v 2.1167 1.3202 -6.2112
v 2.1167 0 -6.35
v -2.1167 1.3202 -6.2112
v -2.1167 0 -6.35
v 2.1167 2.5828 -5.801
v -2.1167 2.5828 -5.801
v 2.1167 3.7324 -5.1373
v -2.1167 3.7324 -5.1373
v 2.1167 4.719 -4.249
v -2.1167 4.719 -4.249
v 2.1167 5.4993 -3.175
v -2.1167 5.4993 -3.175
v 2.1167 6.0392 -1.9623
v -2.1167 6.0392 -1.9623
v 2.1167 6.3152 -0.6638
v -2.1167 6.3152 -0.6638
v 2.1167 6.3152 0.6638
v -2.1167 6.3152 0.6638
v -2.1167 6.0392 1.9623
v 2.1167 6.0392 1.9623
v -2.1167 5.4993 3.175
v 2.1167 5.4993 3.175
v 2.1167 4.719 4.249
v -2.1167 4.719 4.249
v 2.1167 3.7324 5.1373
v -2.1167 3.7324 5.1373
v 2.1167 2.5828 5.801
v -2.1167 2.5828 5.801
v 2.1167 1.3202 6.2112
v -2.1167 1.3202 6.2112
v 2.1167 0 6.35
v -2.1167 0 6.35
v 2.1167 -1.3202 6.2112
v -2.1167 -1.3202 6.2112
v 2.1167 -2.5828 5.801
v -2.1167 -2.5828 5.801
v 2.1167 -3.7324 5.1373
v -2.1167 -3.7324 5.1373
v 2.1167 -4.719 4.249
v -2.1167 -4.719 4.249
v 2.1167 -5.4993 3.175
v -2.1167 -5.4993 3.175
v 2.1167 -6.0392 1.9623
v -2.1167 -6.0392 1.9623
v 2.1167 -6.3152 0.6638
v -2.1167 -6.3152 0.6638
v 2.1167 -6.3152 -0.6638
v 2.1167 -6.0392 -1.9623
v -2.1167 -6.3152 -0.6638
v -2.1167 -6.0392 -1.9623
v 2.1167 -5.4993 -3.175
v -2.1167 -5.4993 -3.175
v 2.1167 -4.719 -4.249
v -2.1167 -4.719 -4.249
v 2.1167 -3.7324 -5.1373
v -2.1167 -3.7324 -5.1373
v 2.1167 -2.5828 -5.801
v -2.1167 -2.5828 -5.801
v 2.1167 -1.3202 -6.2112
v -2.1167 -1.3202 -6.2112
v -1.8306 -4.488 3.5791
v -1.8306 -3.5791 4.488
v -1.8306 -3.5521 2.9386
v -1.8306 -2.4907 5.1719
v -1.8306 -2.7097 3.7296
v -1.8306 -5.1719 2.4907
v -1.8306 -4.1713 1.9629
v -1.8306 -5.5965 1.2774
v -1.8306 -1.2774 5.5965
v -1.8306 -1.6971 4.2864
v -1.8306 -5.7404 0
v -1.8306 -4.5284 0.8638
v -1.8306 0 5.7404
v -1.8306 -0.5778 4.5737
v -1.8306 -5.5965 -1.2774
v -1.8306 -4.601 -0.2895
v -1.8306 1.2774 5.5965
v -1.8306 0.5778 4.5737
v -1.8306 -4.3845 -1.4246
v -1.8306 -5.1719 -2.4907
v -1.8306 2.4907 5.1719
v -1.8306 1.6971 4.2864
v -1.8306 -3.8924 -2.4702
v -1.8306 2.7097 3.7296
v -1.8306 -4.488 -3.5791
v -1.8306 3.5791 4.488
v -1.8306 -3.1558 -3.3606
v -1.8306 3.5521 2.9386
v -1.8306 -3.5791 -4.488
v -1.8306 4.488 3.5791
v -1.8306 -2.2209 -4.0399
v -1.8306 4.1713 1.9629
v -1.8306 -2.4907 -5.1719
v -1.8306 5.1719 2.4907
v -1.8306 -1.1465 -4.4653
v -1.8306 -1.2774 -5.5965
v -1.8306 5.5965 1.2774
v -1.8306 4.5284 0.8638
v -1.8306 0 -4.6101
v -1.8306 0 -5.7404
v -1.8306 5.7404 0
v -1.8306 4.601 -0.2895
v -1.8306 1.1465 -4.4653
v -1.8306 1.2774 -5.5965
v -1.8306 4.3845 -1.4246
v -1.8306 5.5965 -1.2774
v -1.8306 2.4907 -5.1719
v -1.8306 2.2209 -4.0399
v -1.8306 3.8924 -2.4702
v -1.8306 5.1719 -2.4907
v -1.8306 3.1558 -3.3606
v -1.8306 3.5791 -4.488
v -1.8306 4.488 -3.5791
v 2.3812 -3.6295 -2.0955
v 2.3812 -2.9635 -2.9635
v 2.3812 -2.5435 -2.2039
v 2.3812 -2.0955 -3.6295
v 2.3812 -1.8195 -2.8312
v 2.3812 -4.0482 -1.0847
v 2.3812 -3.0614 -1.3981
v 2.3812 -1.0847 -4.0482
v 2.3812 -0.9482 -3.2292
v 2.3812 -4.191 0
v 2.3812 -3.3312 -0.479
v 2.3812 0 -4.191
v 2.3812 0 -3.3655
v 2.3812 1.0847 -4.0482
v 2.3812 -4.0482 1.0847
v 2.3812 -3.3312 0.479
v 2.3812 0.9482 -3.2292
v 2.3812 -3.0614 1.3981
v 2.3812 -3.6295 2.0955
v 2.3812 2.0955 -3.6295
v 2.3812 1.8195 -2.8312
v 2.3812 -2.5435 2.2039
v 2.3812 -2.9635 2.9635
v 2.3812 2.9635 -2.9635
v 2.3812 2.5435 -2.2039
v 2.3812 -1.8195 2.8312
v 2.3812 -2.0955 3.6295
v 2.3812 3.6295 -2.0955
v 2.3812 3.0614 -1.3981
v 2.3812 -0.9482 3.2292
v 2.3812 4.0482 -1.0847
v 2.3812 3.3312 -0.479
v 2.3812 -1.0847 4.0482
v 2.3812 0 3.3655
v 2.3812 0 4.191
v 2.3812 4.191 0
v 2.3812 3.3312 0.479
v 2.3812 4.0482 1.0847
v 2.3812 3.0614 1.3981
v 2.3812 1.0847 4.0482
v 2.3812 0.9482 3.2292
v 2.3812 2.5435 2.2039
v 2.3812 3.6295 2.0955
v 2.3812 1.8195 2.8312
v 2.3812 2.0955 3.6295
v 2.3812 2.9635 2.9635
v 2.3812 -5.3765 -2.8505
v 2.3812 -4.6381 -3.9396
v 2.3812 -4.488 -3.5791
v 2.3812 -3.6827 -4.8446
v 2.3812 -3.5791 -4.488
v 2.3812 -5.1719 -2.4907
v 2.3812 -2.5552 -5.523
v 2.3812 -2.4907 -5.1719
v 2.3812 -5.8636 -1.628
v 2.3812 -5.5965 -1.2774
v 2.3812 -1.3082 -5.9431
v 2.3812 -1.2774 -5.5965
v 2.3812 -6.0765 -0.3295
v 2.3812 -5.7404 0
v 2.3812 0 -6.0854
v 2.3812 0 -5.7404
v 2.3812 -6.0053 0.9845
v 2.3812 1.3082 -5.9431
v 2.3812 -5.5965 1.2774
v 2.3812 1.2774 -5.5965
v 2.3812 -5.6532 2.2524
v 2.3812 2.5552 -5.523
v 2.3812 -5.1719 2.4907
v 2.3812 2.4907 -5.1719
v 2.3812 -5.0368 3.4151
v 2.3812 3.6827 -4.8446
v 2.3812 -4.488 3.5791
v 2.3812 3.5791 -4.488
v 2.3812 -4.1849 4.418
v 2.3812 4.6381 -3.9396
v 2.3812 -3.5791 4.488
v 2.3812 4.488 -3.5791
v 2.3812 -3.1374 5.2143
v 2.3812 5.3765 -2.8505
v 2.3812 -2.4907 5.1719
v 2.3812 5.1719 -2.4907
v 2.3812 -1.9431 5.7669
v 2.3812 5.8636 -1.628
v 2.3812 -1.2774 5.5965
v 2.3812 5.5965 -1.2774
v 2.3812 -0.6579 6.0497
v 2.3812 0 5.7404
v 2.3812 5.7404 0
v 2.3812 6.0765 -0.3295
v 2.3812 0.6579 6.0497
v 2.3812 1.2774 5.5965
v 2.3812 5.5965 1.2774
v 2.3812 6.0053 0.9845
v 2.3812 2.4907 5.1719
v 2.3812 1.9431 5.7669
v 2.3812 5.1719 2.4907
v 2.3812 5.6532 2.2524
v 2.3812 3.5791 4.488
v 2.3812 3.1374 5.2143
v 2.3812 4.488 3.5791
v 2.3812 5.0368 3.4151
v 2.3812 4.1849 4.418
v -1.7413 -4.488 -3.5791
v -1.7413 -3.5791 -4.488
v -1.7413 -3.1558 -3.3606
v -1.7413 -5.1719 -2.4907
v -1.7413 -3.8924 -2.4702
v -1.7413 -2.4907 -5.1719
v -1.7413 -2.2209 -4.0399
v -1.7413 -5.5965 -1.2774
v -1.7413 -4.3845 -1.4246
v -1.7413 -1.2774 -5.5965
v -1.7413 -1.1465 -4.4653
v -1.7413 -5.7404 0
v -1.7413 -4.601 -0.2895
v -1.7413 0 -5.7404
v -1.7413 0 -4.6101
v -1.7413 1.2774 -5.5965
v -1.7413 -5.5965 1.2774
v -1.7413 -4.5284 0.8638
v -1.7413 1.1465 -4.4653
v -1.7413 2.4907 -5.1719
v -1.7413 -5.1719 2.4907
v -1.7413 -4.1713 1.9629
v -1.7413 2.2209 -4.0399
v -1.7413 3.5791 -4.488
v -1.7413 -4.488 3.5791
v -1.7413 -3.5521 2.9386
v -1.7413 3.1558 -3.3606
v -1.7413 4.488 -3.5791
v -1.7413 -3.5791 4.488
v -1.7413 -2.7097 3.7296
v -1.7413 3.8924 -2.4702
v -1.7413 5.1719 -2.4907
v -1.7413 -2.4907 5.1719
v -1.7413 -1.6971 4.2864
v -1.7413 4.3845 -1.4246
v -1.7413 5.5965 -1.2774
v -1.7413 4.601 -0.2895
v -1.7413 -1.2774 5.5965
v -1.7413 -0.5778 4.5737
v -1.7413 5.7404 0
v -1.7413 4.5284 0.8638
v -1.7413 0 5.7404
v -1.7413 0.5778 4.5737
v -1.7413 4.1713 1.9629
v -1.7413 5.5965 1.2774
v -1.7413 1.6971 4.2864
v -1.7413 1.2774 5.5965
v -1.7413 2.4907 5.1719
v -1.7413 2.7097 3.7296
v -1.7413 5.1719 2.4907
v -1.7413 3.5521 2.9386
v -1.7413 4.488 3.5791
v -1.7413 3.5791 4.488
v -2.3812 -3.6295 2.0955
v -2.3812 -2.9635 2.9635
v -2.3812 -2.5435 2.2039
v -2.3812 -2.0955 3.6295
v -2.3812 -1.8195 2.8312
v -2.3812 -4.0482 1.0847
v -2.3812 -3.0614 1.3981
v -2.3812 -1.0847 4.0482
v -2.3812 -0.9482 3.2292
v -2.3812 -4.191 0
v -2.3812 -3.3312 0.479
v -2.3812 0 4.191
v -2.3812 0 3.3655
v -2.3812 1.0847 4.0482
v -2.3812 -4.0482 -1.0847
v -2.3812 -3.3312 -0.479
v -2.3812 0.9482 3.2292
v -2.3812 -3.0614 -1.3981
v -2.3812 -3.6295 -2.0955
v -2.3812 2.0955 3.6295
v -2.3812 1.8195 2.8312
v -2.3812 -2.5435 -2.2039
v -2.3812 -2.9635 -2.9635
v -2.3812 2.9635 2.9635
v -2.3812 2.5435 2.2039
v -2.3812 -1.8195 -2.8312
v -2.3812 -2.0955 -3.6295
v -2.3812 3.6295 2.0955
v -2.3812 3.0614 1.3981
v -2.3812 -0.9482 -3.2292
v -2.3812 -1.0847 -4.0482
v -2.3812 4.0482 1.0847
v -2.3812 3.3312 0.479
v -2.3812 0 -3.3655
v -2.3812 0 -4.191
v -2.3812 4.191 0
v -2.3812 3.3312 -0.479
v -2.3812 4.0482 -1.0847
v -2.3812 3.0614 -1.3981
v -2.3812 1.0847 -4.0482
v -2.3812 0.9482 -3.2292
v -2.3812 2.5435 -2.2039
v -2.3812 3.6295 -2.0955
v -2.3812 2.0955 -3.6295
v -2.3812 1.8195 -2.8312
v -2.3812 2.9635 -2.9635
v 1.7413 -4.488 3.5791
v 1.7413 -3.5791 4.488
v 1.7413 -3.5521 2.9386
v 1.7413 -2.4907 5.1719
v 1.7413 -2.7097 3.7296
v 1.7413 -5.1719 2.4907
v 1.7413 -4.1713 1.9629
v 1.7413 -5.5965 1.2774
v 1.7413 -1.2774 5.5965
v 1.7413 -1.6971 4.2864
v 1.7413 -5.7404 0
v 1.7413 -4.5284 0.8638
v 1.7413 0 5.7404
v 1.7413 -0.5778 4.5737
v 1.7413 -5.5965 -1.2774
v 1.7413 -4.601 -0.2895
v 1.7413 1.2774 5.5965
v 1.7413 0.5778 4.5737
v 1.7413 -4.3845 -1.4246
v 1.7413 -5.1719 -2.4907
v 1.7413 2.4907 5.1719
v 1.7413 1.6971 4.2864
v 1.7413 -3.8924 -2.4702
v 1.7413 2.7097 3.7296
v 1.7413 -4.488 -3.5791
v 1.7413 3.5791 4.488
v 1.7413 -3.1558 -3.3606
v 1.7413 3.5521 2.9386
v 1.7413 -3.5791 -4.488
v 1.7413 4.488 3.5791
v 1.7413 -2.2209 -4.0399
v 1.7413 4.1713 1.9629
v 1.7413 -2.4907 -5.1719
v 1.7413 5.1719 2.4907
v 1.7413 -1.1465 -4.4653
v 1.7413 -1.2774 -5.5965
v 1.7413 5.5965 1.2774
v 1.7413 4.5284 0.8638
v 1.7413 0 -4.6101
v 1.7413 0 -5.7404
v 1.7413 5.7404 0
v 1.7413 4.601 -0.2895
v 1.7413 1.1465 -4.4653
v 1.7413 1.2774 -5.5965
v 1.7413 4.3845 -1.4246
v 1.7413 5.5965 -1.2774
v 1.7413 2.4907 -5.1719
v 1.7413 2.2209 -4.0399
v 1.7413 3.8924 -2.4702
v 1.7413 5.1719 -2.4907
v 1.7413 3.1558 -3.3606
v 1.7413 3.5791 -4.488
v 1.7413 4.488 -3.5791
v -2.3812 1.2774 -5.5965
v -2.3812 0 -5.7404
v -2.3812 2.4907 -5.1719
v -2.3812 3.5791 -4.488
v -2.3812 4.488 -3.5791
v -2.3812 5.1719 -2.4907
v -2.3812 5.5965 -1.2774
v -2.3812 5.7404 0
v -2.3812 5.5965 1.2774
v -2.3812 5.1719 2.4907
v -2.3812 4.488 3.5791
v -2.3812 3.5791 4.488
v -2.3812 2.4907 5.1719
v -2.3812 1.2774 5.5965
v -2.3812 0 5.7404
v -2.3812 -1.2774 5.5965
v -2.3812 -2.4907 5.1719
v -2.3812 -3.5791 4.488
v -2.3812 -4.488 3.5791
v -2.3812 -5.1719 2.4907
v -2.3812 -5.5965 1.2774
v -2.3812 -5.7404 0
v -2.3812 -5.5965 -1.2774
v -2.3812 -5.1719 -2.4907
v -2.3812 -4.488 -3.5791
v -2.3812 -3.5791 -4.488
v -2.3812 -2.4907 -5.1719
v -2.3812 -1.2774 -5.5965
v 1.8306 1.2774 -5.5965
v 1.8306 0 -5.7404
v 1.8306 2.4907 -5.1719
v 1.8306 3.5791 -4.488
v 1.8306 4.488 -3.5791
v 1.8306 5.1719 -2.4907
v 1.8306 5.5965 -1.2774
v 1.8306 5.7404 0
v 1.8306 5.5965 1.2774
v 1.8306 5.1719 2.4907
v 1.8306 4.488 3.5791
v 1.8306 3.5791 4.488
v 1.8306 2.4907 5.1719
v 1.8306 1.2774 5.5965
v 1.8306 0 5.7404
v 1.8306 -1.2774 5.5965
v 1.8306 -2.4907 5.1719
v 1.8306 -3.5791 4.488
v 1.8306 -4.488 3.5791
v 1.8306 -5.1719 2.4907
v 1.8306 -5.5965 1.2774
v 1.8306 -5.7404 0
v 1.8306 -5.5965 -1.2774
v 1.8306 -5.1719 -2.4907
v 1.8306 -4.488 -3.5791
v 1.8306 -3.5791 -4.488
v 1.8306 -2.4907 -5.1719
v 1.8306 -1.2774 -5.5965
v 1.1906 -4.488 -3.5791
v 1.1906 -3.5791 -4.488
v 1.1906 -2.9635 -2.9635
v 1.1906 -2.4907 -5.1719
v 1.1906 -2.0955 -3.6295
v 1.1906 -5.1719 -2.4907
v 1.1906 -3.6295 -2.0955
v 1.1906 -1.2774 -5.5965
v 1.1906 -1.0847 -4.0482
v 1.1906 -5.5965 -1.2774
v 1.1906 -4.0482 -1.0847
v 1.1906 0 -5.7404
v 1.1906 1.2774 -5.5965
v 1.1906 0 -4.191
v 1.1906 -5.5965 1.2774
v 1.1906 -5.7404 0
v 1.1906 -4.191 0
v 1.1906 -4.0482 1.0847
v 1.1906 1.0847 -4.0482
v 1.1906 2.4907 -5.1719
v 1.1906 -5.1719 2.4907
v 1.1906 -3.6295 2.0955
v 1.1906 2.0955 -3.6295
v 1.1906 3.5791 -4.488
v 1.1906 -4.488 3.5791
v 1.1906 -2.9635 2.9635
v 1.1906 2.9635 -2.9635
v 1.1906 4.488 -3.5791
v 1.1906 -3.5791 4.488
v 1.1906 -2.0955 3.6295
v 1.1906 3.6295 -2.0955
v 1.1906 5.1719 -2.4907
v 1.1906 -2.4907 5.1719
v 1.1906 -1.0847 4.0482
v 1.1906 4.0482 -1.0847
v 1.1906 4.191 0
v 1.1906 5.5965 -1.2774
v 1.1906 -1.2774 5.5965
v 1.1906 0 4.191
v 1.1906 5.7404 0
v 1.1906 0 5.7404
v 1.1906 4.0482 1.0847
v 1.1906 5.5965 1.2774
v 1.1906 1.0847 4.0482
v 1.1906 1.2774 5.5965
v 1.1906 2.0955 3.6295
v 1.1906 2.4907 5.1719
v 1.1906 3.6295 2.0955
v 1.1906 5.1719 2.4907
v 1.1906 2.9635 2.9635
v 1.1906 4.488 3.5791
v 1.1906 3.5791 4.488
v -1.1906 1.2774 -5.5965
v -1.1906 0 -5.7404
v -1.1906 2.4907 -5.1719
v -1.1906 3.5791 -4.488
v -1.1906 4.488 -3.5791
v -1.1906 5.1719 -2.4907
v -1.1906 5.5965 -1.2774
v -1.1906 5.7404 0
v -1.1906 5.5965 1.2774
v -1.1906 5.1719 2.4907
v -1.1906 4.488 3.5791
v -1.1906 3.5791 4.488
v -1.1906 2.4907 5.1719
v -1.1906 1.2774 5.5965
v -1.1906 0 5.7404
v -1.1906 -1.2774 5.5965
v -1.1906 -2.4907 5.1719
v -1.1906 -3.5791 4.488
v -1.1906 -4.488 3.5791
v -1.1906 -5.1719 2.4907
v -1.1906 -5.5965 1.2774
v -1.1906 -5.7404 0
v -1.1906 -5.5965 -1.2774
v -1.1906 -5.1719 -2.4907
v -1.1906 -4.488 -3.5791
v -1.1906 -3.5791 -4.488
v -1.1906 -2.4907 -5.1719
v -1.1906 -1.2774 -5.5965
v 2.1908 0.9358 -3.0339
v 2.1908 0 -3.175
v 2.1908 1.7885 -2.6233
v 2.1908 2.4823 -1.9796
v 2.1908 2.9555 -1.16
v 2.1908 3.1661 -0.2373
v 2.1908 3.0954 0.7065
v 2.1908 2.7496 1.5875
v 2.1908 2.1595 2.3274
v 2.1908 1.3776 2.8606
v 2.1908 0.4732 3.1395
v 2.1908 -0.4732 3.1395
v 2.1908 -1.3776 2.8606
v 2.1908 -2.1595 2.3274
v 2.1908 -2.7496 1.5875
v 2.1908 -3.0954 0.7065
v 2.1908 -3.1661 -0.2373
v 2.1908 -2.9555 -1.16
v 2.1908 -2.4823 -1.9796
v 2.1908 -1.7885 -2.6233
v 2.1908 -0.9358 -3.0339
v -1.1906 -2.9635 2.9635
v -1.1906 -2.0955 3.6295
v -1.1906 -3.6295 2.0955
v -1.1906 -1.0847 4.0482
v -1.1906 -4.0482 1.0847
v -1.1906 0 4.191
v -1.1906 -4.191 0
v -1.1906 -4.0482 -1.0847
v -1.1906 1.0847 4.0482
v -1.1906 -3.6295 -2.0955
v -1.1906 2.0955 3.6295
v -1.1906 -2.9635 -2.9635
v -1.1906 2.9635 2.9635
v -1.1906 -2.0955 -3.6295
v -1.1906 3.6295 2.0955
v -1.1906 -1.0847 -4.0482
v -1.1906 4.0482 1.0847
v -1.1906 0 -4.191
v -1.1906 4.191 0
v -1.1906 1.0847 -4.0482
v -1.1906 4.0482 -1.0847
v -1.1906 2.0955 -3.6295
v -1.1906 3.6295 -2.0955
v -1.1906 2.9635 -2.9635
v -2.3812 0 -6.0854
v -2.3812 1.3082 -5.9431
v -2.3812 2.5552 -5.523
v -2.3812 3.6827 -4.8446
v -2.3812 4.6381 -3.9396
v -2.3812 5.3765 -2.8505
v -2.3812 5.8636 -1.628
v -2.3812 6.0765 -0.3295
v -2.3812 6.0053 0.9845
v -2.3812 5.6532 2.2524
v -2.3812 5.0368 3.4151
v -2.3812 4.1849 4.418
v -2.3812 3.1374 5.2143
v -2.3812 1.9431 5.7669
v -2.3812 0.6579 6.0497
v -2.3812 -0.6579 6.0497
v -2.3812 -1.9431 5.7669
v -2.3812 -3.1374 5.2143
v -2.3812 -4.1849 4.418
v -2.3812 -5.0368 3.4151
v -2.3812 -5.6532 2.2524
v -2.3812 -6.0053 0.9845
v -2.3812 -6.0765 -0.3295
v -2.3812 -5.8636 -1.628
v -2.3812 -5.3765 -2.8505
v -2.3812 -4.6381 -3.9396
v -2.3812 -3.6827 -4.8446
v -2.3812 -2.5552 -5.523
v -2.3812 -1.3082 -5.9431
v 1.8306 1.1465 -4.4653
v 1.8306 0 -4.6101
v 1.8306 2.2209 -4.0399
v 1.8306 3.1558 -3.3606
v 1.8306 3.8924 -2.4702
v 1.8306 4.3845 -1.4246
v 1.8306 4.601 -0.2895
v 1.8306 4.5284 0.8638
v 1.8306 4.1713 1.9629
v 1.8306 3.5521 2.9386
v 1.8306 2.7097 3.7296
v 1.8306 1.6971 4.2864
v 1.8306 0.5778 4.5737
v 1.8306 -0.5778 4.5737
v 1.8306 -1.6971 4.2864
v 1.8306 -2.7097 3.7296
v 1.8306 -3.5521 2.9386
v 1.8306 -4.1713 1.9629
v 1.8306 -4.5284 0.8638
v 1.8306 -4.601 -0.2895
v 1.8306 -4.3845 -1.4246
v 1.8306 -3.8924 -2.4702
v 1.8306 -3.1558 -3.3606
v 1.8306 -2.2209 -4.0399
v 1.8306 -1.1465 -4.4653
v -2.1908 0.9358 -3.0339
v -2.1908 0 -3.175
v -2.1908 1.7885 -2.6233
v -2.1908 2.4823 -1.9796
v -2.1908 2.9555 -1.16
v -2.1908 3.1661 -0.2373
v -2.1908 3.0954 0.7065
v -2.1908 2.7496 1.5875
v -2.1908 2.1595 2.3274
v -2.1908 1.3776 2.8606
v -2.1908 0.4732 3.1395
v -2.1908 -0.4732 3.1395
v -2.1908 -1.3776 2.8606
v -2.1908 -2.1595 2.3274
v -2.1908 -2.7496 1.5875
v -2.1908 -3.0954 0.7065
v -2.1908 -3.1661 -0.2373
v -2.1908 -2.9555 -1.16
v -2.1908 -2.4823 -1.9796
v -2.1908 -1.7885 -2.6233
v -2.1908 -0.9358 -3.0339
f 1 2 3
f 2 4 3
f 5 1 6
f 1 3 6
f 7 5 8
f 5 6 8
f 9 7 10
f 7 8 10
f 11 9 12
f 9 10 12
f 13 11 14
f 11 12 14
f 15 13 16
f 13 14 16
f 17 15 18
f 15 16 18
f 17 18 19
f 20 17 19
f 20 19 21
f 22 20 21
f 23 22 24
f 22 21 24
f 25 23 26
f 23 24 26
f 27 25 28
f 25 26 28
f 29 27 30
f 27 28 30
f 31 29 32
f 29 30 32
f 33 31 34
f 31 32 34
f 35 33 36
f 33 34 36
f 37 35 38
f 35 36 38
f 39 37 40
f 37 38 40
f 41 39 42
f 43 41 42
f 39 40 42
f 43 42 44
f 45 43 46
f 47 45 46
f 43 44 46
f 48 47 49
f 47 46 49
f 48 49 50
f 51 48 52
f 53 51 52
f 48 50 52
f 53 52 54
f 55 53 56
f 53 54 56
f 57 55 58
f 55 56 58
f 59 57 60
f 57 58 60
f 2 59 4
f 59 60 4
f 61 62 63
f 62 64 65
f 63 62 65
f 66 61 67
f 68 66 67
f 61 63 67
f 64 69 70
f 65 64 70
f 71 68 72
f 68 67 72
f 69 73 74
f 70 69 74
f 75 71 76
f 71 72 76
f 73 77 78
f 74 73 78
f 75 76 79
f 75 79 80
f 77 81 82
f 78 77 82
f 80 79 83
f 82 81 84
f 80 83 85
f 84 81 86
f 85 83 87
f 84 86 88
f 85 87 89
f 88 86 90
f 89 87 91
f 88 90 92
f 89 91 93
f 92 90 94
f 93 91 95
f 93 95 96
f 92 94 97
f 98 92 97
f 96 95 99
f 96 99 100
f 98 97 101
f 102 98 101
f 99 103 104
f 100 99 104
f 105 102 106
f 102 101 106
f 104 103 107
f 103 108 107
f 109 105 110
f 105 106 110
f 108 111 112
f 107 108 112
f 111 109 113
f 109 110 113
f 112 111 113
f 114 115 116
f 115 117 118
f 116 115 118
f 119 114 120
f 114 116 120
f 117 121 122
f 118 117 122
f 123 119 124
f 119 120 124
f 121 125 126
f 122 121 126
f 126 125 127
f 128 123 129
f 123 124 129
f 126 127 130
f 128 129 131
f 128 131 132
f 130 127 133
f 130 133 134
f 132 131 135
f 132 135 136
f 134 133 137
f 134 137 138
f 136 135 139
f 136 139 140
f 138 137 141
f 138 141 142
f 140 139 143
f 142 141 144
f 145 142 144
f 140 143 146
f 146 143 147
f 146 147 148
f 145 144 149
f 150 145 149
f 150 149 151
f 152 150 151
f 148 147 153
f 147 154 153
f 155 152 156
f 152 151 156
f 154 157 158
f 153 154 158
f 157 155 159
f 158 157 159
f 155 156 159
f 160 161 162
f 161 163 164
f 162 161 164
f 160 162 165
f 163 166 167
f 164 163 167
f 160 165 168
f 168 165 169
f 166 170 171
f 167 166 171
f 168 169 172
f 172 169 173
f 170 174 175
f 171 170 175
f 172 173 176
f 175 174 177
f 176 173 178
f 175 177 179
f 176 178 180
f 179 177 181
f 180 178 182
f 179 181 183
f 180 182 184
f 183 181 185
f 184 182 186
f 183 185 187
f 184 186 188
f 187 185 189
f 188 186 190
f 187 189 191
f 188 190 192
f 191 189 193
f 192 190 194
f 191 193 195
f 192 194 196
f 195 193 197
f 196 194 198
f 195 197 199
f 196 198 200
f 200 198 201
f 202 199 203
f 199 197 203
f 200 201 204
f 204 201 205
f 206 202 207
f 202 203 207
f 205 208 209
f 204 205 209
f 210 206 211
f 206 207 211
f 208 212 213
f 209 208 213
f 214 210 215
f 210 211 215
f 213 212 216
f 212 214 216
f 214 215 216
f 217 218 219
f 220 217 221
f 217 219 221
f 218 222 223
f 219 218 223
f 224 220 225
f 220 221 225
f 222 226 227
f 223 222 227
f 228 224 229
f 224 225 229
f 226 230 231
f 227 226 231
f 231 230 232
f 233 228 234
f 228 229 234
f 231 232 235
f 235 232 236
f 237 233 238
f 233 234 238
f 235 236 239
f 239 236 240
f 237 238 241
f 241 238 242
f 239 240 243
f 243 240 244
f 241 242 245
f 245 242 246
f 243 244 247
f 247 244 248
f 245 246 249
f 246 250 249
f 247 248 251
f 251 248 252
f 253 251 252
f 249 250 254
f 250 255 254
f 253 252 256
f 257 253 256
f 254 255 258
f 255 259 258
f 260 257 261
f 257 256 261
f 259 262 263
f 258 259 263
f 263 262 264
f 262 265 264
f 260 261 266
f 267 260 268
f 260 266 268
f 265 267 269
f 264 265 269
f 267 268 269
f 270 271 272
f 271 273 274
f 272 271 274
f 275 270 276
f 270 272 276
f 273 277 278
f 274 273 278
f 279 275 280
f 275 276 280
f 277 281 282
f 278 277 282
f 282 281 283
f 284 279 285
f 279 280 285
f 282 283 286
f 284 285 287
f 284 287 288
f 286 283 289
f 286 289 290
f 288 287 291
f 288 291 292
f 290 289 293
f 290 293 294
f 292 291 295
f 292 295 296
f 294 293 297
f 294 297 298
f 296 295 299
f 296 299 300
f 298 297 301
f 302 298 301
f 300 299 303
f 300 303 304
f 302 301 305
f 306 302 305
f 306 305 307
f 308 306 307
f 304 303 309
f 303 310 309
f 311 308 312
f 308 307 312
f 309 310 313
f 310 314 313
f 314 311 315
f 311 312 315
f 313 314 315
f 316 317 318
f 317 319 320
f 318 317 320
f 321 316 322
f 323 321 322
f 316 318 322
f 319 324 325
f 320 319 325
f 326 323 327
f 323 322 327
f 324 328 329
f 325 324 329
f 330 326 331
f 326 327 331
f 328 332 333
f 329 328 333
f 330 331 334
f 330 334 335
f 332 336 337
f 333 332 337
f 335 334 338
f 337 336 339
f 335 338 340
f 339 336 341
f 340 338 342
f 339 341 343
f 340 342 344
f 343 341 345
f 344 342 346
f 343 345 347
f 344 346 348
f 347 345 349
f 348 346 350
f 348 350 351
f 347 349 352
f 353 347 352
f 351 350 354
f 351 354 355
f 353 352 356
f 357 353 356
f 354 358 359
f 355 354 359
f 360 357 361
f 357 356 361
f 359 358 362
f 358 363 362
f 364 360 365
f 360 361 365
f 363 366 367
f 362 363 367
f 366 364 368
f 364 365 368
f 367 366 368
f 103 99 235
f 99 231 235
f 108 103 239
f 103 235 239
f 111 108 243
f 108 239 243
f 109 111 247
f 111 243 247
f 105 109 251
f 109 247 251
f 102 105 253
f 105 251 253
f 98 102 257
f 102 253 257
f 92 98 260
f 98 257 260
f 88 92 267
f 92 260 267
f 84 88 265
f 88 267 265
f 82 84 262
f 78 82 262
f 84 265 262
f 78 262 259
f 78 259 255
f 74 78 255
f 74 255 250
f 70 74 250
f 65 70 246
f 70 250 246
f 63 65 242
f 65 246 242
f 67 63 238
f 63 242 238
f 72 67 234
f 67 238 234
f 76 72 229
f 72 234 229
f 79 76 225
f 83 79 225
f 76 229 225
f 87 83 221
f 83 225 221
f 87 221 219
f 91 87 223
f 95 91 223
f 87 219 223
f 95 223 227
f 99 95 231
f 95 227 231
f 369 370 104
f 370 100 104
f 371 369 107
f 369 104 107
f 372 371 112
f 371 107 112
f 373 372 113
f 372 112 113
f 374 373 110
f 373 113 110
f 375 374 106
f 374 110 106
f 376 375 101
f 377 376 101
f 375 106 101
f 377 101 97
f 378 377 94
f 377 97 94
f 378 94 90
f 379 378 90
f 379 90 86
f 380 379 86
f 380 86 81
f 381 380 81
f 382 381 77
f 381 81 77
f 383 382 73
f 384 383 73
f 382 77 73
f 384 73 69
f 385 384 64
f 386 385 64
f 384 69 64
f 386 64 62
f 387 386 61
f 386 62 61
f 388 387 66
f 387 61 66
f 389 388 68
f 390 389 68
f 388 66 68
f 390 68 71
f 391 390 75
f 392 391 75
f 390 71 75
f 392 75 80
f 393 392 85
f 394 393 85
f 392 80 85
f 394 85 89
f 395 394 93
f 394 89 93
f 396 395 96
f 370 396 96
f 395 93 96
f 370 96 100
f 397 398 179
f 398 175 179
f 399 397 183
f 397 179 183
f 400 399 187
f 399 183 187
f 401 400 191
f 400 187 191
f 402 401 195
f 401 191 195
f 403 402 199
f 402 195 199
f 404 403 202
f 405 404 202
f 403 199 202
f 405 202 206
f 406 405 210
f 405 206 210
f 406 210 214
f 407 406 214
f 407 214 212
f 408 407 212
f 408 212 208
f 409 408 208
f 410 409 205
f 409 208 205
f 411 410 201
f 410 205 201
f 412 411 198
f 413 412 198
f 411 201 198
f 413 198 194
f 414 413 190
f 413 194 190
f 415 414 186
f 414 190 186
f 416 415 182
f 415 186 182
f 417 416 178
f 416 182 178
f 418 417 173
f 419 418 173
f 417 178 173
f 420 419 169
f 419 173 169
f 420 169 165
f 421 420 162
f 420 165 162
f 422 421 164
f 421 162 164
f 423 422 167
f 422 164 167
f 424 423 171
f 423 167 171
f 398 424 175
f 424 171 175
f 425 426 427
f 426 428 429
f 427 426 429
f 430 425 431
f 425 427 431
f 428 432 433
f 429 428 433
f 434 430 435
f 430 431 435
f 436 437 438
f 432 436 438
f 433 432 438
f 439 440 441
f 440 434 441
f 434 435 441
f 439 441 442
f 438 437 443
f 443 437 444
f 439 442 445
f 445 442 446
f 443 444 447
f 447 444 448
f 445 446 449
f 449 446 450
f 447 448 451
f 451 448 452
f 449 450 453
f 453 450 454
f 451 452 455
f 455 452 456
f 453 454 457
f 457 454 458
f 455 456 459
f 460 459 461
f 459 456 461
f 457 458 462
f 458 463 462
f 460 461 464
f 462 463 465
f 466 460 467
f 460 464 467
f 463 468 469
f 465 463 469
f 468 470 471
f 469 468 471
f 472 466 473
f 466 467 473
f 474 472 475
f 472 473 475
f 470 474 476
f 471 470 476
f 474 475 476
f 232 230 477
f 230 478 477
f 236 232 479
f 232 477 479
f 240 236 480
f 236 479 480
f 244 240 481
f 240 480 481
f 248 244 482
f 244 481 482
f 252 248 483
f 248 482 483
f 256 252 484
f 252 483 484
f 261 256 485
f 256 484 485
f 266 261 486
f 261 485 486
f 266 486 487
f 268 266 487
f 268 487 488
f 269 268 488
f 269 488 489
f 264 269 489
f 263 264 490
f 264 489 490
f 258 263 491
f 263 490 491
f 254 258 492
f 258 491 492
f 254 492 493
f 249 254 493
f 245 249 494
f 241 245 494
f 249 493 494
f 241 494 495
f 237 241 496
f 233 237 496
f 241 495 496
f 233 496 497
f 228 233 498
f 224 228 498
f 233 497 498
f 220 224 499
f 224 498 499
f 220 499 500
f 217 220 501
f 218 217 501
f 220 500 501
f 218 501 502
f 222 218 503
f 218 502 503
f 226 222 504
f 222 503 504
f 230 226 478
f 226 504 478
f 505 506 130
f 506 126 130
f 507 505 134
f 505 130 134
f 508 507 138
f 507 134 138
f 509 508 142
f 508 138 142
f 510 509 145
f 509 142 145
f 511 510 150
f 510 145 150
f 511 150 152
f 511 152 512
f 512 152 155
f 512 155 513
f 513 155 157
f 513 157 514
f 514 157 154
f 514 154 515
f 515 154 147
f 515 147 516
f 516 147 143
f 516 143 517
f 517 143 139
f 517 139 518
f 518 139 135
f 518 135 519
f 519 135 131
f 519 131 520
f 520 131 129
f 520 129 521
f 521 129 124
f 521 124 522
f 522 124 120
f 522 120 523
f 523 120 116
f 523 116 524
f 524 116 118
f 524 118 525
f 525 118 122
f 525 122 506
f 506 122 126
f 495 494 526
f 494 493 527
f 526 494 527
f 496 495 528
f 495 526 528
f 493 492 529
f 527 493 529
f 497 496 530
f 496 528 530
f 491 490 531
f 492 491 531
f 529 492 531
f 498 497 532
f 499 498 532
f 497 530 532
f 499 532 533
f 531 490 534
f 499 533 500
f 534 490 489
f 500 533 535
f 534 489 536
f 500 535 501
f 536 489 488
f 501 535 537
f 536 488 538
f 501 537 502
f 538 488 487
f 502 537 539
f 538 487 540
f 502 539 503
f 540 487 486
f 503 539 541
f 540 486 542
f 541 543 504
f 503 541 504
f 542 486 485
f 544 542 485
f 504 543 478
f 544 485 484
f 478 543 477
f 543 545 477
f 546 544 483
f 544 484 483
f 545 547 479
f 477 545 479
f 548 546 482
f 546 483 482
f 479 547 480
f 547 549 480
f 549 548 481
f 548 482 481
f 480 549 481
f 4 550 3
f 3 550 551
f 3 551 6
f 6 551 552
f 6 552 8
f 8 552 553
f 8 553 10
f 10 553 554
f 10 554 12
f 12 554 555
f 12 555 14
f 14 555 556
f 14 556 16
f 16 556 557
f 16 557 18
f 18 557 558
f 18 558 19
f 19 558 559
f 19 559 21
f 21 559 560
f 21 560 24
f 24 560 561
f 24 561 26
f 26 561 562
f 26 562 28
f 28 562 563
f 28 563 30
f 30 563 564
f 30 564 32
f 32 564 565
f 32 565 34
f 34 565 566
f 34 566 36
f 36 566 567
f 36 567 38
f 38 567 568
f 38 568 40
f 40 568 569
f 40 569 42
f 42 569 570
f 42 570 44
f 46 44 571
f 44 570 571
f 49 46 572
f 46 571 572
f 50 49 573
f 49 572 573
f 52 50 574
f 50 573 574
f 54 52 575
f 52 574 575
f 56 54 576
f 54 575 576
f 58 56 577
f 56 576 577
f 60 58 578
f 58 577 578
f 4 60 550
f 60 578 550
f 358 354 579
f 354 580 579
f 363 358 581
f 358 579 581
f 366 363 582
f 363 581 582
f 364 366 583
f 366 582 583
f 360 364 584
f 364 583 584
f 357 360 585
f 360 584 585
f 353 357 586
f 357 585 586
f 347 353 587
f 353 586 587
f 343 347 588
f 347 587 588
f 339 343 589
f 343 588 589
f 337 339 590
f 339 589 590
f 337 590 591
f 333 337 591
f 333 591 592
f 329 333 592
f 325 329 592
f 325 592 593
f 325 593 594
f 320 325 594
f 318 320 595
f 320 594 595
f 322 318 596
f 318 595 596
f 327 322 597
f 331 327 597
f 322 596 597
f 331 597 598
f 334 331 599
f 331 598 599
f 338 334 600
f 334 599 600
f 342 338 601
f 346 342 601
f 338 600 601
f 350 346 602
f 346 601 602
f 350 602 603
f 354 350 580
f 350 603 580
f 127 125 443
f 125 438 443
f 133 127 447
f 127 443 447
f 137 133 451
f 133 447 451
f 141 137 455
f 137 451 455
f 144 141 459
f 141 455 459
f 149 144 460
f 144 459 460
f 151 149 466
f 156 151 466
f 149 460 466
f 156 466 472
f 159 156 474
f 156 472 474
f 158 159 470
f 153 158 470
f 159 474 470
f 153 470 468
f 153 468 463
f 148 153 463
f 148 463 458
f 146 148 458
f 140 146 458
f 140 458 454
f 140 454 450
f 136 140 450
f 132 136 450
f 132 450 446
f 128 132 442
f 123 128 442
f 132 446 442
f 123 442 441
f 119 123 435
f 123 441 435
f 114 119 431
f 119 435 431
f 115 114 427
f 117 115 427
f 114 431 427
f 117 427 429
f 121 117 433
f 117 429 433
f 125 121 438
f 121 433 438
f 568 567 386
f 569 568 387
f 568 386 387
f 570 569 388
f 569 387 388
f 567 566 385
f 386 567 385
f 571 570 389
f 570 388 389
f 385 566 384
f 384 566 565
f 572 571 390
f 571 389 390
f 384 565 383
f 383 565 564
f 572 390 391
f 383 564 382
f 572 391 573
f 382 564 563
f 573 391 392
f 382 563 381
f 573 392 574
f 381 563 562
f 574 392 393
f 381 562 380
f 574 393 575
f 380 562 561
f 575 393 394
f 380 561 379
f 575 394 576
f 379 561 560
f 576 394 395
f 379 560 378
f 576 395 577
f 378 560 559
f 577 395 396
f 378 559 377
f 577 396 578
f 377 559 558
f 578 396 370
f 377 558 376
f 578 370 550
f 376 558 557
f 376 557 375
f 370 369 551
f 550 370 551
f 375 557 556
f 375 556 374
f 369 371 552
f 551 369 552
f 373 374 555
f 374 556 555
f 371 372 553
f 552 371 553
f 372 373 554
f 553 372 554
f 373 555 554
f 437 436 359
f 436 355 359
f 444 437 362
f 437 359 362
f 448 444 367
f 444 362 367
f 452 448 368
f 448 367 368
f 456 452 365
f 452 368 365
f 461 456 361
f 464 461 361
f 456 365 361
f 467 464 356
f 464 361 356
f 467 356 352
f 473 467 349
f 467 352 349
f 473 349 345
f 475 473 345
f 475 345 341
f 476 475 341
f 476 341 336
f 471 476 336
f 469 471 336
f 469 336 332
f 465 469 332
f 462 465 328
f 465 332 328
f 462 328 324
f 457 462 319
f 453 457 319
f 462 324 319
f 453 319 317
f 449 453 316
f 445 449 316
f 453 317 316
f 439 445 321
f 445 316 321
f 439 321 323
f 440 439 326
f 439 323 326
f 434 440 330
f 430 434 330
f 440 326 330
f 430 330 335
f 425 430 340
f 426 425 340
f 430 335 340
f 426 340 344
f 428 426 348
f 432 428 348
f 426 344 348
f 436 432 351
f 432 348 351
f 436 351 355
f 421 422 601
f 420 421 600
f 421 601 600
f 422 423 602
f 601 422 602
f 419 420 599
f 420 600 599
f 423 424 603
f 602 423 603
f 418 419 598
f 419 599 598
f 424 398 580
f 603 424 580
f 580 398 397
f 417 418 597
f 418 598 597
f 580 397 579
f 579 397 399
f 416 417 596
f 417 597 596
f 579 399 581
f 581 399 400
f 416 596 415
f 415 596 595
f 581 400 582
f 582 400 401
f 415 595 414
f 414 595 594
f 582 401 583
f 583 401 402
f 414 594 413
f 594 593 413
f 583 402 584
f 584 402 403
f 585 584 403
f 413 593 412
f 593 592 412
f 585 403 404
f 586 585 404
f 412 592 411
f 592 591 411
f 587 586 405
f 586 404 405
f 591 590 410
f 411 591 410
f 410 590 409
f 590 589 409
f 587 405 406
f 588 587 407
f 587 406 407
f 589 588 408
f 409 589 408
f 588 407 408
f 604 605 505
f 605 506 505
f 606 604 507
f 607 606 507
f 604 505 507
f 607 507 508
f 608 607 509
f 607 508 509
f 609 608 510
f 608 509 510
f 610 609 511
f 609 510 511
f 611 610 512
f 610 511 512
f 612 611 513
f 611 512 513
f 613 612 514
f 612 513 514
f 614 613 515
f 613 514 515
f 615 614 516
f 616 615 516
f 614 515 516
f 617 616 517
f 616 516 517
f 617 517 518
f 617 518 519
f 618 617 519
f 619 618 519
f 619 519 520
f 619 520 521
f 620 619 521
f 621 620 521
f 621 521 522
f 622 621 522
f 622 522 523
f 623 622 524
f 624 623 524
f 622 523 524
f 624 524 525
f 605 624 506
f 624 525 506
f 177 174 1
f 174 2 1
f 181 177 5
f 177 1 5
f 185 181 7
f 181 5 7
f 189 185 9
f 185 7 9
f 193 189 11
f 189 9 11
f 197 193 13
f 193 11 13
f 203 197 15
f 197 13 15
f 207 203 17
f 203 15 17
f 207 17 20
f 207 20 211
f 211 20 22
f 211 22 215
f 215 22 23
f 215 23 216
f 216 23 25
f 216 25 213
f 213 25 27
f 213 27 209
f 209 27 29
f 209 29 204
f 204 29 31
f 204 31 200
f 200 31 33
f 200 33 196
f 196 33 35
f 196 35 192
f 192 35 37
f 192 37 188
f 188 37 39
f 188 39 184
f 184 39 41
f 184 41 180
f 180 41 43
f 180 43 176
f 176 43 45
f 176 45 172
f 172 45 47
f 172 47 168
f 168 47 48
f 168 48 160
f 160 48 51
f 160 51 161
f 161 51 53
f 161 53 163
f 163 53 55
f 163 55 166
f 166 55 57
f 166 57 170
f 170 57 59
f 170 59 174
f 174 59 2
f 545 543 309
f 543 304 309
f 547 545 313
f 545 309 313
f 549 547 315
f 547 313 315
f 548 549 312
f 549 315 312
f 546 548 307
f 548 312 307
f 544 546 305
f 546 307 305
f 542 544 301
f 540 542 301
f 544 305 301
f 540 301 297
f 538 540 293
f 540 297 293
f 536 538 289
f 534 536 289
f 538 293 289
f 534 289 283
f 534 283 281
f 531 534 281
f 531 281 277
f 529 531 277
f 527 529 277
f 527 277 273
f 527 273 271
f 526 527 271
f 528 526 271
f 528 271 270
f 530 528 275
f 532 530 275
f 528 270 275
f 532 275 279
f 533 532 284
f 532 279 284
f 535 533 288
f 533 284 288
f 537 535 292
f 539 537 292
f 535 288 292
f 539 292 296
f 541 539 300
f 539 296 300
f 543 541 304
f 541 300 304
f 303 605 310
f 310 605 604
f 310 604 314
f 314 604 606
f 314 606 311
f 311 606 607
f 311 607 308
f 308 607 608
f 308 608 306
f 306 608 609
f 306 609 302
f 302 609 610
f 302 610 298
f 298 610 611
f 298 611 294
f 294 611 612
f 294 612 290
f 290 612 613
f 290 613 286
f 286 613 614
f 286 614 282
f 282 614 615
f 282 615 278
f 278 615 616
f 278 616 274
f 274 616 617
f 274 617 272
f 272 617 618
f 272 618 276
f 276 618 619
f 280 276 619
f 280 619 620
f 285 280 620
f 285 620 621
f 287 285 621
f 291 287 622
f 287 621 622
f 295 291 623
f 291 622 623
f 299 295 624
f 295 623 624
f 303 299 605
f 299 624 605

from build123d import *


with BuildPart() as part:
    # Sketch1 → Revolve1 (revolve)
    with BuildSketch(Plane.XY, mode=Mode.PRIVATE) as revolve1_sk:
        Polygon((-2.38125, 3.3655), (-2.19075, 3.175), (2.19075, 3.175), (2.38125, 3.3655), (2.38125, 4.191), (1.190625, 4.191), (1.190625, 5.7404), (1.741289063, 5.7404), (1.741289063, 4.6101), (1.830585938, 4.6101), (1.830585938, 5.7404), (2.38125, 5.7404), (2.38125, 6.085416667), (2.116666667, 6.35), (-2.116666667, 6.35), (-2.38125, 6.085416667), (-2.38125, 5.7404), (-1.830585937, 5.7404), (-1.830585937, 4.6101), (-1.741289062, 4.6101), (-1.741289062, 5.7404), (-1.190625, 5.7404), (-1.190625, 4.191), (-2.38125, 4.191), align=None)
    revolve(revolve1_sk.sketch.rotate(Axis((-2.38125, 0, 0), (1, 0, 0)), 270), axis=Axis((-2.38125, 0, 0), (1, 0, 0)))


solid = part.part
